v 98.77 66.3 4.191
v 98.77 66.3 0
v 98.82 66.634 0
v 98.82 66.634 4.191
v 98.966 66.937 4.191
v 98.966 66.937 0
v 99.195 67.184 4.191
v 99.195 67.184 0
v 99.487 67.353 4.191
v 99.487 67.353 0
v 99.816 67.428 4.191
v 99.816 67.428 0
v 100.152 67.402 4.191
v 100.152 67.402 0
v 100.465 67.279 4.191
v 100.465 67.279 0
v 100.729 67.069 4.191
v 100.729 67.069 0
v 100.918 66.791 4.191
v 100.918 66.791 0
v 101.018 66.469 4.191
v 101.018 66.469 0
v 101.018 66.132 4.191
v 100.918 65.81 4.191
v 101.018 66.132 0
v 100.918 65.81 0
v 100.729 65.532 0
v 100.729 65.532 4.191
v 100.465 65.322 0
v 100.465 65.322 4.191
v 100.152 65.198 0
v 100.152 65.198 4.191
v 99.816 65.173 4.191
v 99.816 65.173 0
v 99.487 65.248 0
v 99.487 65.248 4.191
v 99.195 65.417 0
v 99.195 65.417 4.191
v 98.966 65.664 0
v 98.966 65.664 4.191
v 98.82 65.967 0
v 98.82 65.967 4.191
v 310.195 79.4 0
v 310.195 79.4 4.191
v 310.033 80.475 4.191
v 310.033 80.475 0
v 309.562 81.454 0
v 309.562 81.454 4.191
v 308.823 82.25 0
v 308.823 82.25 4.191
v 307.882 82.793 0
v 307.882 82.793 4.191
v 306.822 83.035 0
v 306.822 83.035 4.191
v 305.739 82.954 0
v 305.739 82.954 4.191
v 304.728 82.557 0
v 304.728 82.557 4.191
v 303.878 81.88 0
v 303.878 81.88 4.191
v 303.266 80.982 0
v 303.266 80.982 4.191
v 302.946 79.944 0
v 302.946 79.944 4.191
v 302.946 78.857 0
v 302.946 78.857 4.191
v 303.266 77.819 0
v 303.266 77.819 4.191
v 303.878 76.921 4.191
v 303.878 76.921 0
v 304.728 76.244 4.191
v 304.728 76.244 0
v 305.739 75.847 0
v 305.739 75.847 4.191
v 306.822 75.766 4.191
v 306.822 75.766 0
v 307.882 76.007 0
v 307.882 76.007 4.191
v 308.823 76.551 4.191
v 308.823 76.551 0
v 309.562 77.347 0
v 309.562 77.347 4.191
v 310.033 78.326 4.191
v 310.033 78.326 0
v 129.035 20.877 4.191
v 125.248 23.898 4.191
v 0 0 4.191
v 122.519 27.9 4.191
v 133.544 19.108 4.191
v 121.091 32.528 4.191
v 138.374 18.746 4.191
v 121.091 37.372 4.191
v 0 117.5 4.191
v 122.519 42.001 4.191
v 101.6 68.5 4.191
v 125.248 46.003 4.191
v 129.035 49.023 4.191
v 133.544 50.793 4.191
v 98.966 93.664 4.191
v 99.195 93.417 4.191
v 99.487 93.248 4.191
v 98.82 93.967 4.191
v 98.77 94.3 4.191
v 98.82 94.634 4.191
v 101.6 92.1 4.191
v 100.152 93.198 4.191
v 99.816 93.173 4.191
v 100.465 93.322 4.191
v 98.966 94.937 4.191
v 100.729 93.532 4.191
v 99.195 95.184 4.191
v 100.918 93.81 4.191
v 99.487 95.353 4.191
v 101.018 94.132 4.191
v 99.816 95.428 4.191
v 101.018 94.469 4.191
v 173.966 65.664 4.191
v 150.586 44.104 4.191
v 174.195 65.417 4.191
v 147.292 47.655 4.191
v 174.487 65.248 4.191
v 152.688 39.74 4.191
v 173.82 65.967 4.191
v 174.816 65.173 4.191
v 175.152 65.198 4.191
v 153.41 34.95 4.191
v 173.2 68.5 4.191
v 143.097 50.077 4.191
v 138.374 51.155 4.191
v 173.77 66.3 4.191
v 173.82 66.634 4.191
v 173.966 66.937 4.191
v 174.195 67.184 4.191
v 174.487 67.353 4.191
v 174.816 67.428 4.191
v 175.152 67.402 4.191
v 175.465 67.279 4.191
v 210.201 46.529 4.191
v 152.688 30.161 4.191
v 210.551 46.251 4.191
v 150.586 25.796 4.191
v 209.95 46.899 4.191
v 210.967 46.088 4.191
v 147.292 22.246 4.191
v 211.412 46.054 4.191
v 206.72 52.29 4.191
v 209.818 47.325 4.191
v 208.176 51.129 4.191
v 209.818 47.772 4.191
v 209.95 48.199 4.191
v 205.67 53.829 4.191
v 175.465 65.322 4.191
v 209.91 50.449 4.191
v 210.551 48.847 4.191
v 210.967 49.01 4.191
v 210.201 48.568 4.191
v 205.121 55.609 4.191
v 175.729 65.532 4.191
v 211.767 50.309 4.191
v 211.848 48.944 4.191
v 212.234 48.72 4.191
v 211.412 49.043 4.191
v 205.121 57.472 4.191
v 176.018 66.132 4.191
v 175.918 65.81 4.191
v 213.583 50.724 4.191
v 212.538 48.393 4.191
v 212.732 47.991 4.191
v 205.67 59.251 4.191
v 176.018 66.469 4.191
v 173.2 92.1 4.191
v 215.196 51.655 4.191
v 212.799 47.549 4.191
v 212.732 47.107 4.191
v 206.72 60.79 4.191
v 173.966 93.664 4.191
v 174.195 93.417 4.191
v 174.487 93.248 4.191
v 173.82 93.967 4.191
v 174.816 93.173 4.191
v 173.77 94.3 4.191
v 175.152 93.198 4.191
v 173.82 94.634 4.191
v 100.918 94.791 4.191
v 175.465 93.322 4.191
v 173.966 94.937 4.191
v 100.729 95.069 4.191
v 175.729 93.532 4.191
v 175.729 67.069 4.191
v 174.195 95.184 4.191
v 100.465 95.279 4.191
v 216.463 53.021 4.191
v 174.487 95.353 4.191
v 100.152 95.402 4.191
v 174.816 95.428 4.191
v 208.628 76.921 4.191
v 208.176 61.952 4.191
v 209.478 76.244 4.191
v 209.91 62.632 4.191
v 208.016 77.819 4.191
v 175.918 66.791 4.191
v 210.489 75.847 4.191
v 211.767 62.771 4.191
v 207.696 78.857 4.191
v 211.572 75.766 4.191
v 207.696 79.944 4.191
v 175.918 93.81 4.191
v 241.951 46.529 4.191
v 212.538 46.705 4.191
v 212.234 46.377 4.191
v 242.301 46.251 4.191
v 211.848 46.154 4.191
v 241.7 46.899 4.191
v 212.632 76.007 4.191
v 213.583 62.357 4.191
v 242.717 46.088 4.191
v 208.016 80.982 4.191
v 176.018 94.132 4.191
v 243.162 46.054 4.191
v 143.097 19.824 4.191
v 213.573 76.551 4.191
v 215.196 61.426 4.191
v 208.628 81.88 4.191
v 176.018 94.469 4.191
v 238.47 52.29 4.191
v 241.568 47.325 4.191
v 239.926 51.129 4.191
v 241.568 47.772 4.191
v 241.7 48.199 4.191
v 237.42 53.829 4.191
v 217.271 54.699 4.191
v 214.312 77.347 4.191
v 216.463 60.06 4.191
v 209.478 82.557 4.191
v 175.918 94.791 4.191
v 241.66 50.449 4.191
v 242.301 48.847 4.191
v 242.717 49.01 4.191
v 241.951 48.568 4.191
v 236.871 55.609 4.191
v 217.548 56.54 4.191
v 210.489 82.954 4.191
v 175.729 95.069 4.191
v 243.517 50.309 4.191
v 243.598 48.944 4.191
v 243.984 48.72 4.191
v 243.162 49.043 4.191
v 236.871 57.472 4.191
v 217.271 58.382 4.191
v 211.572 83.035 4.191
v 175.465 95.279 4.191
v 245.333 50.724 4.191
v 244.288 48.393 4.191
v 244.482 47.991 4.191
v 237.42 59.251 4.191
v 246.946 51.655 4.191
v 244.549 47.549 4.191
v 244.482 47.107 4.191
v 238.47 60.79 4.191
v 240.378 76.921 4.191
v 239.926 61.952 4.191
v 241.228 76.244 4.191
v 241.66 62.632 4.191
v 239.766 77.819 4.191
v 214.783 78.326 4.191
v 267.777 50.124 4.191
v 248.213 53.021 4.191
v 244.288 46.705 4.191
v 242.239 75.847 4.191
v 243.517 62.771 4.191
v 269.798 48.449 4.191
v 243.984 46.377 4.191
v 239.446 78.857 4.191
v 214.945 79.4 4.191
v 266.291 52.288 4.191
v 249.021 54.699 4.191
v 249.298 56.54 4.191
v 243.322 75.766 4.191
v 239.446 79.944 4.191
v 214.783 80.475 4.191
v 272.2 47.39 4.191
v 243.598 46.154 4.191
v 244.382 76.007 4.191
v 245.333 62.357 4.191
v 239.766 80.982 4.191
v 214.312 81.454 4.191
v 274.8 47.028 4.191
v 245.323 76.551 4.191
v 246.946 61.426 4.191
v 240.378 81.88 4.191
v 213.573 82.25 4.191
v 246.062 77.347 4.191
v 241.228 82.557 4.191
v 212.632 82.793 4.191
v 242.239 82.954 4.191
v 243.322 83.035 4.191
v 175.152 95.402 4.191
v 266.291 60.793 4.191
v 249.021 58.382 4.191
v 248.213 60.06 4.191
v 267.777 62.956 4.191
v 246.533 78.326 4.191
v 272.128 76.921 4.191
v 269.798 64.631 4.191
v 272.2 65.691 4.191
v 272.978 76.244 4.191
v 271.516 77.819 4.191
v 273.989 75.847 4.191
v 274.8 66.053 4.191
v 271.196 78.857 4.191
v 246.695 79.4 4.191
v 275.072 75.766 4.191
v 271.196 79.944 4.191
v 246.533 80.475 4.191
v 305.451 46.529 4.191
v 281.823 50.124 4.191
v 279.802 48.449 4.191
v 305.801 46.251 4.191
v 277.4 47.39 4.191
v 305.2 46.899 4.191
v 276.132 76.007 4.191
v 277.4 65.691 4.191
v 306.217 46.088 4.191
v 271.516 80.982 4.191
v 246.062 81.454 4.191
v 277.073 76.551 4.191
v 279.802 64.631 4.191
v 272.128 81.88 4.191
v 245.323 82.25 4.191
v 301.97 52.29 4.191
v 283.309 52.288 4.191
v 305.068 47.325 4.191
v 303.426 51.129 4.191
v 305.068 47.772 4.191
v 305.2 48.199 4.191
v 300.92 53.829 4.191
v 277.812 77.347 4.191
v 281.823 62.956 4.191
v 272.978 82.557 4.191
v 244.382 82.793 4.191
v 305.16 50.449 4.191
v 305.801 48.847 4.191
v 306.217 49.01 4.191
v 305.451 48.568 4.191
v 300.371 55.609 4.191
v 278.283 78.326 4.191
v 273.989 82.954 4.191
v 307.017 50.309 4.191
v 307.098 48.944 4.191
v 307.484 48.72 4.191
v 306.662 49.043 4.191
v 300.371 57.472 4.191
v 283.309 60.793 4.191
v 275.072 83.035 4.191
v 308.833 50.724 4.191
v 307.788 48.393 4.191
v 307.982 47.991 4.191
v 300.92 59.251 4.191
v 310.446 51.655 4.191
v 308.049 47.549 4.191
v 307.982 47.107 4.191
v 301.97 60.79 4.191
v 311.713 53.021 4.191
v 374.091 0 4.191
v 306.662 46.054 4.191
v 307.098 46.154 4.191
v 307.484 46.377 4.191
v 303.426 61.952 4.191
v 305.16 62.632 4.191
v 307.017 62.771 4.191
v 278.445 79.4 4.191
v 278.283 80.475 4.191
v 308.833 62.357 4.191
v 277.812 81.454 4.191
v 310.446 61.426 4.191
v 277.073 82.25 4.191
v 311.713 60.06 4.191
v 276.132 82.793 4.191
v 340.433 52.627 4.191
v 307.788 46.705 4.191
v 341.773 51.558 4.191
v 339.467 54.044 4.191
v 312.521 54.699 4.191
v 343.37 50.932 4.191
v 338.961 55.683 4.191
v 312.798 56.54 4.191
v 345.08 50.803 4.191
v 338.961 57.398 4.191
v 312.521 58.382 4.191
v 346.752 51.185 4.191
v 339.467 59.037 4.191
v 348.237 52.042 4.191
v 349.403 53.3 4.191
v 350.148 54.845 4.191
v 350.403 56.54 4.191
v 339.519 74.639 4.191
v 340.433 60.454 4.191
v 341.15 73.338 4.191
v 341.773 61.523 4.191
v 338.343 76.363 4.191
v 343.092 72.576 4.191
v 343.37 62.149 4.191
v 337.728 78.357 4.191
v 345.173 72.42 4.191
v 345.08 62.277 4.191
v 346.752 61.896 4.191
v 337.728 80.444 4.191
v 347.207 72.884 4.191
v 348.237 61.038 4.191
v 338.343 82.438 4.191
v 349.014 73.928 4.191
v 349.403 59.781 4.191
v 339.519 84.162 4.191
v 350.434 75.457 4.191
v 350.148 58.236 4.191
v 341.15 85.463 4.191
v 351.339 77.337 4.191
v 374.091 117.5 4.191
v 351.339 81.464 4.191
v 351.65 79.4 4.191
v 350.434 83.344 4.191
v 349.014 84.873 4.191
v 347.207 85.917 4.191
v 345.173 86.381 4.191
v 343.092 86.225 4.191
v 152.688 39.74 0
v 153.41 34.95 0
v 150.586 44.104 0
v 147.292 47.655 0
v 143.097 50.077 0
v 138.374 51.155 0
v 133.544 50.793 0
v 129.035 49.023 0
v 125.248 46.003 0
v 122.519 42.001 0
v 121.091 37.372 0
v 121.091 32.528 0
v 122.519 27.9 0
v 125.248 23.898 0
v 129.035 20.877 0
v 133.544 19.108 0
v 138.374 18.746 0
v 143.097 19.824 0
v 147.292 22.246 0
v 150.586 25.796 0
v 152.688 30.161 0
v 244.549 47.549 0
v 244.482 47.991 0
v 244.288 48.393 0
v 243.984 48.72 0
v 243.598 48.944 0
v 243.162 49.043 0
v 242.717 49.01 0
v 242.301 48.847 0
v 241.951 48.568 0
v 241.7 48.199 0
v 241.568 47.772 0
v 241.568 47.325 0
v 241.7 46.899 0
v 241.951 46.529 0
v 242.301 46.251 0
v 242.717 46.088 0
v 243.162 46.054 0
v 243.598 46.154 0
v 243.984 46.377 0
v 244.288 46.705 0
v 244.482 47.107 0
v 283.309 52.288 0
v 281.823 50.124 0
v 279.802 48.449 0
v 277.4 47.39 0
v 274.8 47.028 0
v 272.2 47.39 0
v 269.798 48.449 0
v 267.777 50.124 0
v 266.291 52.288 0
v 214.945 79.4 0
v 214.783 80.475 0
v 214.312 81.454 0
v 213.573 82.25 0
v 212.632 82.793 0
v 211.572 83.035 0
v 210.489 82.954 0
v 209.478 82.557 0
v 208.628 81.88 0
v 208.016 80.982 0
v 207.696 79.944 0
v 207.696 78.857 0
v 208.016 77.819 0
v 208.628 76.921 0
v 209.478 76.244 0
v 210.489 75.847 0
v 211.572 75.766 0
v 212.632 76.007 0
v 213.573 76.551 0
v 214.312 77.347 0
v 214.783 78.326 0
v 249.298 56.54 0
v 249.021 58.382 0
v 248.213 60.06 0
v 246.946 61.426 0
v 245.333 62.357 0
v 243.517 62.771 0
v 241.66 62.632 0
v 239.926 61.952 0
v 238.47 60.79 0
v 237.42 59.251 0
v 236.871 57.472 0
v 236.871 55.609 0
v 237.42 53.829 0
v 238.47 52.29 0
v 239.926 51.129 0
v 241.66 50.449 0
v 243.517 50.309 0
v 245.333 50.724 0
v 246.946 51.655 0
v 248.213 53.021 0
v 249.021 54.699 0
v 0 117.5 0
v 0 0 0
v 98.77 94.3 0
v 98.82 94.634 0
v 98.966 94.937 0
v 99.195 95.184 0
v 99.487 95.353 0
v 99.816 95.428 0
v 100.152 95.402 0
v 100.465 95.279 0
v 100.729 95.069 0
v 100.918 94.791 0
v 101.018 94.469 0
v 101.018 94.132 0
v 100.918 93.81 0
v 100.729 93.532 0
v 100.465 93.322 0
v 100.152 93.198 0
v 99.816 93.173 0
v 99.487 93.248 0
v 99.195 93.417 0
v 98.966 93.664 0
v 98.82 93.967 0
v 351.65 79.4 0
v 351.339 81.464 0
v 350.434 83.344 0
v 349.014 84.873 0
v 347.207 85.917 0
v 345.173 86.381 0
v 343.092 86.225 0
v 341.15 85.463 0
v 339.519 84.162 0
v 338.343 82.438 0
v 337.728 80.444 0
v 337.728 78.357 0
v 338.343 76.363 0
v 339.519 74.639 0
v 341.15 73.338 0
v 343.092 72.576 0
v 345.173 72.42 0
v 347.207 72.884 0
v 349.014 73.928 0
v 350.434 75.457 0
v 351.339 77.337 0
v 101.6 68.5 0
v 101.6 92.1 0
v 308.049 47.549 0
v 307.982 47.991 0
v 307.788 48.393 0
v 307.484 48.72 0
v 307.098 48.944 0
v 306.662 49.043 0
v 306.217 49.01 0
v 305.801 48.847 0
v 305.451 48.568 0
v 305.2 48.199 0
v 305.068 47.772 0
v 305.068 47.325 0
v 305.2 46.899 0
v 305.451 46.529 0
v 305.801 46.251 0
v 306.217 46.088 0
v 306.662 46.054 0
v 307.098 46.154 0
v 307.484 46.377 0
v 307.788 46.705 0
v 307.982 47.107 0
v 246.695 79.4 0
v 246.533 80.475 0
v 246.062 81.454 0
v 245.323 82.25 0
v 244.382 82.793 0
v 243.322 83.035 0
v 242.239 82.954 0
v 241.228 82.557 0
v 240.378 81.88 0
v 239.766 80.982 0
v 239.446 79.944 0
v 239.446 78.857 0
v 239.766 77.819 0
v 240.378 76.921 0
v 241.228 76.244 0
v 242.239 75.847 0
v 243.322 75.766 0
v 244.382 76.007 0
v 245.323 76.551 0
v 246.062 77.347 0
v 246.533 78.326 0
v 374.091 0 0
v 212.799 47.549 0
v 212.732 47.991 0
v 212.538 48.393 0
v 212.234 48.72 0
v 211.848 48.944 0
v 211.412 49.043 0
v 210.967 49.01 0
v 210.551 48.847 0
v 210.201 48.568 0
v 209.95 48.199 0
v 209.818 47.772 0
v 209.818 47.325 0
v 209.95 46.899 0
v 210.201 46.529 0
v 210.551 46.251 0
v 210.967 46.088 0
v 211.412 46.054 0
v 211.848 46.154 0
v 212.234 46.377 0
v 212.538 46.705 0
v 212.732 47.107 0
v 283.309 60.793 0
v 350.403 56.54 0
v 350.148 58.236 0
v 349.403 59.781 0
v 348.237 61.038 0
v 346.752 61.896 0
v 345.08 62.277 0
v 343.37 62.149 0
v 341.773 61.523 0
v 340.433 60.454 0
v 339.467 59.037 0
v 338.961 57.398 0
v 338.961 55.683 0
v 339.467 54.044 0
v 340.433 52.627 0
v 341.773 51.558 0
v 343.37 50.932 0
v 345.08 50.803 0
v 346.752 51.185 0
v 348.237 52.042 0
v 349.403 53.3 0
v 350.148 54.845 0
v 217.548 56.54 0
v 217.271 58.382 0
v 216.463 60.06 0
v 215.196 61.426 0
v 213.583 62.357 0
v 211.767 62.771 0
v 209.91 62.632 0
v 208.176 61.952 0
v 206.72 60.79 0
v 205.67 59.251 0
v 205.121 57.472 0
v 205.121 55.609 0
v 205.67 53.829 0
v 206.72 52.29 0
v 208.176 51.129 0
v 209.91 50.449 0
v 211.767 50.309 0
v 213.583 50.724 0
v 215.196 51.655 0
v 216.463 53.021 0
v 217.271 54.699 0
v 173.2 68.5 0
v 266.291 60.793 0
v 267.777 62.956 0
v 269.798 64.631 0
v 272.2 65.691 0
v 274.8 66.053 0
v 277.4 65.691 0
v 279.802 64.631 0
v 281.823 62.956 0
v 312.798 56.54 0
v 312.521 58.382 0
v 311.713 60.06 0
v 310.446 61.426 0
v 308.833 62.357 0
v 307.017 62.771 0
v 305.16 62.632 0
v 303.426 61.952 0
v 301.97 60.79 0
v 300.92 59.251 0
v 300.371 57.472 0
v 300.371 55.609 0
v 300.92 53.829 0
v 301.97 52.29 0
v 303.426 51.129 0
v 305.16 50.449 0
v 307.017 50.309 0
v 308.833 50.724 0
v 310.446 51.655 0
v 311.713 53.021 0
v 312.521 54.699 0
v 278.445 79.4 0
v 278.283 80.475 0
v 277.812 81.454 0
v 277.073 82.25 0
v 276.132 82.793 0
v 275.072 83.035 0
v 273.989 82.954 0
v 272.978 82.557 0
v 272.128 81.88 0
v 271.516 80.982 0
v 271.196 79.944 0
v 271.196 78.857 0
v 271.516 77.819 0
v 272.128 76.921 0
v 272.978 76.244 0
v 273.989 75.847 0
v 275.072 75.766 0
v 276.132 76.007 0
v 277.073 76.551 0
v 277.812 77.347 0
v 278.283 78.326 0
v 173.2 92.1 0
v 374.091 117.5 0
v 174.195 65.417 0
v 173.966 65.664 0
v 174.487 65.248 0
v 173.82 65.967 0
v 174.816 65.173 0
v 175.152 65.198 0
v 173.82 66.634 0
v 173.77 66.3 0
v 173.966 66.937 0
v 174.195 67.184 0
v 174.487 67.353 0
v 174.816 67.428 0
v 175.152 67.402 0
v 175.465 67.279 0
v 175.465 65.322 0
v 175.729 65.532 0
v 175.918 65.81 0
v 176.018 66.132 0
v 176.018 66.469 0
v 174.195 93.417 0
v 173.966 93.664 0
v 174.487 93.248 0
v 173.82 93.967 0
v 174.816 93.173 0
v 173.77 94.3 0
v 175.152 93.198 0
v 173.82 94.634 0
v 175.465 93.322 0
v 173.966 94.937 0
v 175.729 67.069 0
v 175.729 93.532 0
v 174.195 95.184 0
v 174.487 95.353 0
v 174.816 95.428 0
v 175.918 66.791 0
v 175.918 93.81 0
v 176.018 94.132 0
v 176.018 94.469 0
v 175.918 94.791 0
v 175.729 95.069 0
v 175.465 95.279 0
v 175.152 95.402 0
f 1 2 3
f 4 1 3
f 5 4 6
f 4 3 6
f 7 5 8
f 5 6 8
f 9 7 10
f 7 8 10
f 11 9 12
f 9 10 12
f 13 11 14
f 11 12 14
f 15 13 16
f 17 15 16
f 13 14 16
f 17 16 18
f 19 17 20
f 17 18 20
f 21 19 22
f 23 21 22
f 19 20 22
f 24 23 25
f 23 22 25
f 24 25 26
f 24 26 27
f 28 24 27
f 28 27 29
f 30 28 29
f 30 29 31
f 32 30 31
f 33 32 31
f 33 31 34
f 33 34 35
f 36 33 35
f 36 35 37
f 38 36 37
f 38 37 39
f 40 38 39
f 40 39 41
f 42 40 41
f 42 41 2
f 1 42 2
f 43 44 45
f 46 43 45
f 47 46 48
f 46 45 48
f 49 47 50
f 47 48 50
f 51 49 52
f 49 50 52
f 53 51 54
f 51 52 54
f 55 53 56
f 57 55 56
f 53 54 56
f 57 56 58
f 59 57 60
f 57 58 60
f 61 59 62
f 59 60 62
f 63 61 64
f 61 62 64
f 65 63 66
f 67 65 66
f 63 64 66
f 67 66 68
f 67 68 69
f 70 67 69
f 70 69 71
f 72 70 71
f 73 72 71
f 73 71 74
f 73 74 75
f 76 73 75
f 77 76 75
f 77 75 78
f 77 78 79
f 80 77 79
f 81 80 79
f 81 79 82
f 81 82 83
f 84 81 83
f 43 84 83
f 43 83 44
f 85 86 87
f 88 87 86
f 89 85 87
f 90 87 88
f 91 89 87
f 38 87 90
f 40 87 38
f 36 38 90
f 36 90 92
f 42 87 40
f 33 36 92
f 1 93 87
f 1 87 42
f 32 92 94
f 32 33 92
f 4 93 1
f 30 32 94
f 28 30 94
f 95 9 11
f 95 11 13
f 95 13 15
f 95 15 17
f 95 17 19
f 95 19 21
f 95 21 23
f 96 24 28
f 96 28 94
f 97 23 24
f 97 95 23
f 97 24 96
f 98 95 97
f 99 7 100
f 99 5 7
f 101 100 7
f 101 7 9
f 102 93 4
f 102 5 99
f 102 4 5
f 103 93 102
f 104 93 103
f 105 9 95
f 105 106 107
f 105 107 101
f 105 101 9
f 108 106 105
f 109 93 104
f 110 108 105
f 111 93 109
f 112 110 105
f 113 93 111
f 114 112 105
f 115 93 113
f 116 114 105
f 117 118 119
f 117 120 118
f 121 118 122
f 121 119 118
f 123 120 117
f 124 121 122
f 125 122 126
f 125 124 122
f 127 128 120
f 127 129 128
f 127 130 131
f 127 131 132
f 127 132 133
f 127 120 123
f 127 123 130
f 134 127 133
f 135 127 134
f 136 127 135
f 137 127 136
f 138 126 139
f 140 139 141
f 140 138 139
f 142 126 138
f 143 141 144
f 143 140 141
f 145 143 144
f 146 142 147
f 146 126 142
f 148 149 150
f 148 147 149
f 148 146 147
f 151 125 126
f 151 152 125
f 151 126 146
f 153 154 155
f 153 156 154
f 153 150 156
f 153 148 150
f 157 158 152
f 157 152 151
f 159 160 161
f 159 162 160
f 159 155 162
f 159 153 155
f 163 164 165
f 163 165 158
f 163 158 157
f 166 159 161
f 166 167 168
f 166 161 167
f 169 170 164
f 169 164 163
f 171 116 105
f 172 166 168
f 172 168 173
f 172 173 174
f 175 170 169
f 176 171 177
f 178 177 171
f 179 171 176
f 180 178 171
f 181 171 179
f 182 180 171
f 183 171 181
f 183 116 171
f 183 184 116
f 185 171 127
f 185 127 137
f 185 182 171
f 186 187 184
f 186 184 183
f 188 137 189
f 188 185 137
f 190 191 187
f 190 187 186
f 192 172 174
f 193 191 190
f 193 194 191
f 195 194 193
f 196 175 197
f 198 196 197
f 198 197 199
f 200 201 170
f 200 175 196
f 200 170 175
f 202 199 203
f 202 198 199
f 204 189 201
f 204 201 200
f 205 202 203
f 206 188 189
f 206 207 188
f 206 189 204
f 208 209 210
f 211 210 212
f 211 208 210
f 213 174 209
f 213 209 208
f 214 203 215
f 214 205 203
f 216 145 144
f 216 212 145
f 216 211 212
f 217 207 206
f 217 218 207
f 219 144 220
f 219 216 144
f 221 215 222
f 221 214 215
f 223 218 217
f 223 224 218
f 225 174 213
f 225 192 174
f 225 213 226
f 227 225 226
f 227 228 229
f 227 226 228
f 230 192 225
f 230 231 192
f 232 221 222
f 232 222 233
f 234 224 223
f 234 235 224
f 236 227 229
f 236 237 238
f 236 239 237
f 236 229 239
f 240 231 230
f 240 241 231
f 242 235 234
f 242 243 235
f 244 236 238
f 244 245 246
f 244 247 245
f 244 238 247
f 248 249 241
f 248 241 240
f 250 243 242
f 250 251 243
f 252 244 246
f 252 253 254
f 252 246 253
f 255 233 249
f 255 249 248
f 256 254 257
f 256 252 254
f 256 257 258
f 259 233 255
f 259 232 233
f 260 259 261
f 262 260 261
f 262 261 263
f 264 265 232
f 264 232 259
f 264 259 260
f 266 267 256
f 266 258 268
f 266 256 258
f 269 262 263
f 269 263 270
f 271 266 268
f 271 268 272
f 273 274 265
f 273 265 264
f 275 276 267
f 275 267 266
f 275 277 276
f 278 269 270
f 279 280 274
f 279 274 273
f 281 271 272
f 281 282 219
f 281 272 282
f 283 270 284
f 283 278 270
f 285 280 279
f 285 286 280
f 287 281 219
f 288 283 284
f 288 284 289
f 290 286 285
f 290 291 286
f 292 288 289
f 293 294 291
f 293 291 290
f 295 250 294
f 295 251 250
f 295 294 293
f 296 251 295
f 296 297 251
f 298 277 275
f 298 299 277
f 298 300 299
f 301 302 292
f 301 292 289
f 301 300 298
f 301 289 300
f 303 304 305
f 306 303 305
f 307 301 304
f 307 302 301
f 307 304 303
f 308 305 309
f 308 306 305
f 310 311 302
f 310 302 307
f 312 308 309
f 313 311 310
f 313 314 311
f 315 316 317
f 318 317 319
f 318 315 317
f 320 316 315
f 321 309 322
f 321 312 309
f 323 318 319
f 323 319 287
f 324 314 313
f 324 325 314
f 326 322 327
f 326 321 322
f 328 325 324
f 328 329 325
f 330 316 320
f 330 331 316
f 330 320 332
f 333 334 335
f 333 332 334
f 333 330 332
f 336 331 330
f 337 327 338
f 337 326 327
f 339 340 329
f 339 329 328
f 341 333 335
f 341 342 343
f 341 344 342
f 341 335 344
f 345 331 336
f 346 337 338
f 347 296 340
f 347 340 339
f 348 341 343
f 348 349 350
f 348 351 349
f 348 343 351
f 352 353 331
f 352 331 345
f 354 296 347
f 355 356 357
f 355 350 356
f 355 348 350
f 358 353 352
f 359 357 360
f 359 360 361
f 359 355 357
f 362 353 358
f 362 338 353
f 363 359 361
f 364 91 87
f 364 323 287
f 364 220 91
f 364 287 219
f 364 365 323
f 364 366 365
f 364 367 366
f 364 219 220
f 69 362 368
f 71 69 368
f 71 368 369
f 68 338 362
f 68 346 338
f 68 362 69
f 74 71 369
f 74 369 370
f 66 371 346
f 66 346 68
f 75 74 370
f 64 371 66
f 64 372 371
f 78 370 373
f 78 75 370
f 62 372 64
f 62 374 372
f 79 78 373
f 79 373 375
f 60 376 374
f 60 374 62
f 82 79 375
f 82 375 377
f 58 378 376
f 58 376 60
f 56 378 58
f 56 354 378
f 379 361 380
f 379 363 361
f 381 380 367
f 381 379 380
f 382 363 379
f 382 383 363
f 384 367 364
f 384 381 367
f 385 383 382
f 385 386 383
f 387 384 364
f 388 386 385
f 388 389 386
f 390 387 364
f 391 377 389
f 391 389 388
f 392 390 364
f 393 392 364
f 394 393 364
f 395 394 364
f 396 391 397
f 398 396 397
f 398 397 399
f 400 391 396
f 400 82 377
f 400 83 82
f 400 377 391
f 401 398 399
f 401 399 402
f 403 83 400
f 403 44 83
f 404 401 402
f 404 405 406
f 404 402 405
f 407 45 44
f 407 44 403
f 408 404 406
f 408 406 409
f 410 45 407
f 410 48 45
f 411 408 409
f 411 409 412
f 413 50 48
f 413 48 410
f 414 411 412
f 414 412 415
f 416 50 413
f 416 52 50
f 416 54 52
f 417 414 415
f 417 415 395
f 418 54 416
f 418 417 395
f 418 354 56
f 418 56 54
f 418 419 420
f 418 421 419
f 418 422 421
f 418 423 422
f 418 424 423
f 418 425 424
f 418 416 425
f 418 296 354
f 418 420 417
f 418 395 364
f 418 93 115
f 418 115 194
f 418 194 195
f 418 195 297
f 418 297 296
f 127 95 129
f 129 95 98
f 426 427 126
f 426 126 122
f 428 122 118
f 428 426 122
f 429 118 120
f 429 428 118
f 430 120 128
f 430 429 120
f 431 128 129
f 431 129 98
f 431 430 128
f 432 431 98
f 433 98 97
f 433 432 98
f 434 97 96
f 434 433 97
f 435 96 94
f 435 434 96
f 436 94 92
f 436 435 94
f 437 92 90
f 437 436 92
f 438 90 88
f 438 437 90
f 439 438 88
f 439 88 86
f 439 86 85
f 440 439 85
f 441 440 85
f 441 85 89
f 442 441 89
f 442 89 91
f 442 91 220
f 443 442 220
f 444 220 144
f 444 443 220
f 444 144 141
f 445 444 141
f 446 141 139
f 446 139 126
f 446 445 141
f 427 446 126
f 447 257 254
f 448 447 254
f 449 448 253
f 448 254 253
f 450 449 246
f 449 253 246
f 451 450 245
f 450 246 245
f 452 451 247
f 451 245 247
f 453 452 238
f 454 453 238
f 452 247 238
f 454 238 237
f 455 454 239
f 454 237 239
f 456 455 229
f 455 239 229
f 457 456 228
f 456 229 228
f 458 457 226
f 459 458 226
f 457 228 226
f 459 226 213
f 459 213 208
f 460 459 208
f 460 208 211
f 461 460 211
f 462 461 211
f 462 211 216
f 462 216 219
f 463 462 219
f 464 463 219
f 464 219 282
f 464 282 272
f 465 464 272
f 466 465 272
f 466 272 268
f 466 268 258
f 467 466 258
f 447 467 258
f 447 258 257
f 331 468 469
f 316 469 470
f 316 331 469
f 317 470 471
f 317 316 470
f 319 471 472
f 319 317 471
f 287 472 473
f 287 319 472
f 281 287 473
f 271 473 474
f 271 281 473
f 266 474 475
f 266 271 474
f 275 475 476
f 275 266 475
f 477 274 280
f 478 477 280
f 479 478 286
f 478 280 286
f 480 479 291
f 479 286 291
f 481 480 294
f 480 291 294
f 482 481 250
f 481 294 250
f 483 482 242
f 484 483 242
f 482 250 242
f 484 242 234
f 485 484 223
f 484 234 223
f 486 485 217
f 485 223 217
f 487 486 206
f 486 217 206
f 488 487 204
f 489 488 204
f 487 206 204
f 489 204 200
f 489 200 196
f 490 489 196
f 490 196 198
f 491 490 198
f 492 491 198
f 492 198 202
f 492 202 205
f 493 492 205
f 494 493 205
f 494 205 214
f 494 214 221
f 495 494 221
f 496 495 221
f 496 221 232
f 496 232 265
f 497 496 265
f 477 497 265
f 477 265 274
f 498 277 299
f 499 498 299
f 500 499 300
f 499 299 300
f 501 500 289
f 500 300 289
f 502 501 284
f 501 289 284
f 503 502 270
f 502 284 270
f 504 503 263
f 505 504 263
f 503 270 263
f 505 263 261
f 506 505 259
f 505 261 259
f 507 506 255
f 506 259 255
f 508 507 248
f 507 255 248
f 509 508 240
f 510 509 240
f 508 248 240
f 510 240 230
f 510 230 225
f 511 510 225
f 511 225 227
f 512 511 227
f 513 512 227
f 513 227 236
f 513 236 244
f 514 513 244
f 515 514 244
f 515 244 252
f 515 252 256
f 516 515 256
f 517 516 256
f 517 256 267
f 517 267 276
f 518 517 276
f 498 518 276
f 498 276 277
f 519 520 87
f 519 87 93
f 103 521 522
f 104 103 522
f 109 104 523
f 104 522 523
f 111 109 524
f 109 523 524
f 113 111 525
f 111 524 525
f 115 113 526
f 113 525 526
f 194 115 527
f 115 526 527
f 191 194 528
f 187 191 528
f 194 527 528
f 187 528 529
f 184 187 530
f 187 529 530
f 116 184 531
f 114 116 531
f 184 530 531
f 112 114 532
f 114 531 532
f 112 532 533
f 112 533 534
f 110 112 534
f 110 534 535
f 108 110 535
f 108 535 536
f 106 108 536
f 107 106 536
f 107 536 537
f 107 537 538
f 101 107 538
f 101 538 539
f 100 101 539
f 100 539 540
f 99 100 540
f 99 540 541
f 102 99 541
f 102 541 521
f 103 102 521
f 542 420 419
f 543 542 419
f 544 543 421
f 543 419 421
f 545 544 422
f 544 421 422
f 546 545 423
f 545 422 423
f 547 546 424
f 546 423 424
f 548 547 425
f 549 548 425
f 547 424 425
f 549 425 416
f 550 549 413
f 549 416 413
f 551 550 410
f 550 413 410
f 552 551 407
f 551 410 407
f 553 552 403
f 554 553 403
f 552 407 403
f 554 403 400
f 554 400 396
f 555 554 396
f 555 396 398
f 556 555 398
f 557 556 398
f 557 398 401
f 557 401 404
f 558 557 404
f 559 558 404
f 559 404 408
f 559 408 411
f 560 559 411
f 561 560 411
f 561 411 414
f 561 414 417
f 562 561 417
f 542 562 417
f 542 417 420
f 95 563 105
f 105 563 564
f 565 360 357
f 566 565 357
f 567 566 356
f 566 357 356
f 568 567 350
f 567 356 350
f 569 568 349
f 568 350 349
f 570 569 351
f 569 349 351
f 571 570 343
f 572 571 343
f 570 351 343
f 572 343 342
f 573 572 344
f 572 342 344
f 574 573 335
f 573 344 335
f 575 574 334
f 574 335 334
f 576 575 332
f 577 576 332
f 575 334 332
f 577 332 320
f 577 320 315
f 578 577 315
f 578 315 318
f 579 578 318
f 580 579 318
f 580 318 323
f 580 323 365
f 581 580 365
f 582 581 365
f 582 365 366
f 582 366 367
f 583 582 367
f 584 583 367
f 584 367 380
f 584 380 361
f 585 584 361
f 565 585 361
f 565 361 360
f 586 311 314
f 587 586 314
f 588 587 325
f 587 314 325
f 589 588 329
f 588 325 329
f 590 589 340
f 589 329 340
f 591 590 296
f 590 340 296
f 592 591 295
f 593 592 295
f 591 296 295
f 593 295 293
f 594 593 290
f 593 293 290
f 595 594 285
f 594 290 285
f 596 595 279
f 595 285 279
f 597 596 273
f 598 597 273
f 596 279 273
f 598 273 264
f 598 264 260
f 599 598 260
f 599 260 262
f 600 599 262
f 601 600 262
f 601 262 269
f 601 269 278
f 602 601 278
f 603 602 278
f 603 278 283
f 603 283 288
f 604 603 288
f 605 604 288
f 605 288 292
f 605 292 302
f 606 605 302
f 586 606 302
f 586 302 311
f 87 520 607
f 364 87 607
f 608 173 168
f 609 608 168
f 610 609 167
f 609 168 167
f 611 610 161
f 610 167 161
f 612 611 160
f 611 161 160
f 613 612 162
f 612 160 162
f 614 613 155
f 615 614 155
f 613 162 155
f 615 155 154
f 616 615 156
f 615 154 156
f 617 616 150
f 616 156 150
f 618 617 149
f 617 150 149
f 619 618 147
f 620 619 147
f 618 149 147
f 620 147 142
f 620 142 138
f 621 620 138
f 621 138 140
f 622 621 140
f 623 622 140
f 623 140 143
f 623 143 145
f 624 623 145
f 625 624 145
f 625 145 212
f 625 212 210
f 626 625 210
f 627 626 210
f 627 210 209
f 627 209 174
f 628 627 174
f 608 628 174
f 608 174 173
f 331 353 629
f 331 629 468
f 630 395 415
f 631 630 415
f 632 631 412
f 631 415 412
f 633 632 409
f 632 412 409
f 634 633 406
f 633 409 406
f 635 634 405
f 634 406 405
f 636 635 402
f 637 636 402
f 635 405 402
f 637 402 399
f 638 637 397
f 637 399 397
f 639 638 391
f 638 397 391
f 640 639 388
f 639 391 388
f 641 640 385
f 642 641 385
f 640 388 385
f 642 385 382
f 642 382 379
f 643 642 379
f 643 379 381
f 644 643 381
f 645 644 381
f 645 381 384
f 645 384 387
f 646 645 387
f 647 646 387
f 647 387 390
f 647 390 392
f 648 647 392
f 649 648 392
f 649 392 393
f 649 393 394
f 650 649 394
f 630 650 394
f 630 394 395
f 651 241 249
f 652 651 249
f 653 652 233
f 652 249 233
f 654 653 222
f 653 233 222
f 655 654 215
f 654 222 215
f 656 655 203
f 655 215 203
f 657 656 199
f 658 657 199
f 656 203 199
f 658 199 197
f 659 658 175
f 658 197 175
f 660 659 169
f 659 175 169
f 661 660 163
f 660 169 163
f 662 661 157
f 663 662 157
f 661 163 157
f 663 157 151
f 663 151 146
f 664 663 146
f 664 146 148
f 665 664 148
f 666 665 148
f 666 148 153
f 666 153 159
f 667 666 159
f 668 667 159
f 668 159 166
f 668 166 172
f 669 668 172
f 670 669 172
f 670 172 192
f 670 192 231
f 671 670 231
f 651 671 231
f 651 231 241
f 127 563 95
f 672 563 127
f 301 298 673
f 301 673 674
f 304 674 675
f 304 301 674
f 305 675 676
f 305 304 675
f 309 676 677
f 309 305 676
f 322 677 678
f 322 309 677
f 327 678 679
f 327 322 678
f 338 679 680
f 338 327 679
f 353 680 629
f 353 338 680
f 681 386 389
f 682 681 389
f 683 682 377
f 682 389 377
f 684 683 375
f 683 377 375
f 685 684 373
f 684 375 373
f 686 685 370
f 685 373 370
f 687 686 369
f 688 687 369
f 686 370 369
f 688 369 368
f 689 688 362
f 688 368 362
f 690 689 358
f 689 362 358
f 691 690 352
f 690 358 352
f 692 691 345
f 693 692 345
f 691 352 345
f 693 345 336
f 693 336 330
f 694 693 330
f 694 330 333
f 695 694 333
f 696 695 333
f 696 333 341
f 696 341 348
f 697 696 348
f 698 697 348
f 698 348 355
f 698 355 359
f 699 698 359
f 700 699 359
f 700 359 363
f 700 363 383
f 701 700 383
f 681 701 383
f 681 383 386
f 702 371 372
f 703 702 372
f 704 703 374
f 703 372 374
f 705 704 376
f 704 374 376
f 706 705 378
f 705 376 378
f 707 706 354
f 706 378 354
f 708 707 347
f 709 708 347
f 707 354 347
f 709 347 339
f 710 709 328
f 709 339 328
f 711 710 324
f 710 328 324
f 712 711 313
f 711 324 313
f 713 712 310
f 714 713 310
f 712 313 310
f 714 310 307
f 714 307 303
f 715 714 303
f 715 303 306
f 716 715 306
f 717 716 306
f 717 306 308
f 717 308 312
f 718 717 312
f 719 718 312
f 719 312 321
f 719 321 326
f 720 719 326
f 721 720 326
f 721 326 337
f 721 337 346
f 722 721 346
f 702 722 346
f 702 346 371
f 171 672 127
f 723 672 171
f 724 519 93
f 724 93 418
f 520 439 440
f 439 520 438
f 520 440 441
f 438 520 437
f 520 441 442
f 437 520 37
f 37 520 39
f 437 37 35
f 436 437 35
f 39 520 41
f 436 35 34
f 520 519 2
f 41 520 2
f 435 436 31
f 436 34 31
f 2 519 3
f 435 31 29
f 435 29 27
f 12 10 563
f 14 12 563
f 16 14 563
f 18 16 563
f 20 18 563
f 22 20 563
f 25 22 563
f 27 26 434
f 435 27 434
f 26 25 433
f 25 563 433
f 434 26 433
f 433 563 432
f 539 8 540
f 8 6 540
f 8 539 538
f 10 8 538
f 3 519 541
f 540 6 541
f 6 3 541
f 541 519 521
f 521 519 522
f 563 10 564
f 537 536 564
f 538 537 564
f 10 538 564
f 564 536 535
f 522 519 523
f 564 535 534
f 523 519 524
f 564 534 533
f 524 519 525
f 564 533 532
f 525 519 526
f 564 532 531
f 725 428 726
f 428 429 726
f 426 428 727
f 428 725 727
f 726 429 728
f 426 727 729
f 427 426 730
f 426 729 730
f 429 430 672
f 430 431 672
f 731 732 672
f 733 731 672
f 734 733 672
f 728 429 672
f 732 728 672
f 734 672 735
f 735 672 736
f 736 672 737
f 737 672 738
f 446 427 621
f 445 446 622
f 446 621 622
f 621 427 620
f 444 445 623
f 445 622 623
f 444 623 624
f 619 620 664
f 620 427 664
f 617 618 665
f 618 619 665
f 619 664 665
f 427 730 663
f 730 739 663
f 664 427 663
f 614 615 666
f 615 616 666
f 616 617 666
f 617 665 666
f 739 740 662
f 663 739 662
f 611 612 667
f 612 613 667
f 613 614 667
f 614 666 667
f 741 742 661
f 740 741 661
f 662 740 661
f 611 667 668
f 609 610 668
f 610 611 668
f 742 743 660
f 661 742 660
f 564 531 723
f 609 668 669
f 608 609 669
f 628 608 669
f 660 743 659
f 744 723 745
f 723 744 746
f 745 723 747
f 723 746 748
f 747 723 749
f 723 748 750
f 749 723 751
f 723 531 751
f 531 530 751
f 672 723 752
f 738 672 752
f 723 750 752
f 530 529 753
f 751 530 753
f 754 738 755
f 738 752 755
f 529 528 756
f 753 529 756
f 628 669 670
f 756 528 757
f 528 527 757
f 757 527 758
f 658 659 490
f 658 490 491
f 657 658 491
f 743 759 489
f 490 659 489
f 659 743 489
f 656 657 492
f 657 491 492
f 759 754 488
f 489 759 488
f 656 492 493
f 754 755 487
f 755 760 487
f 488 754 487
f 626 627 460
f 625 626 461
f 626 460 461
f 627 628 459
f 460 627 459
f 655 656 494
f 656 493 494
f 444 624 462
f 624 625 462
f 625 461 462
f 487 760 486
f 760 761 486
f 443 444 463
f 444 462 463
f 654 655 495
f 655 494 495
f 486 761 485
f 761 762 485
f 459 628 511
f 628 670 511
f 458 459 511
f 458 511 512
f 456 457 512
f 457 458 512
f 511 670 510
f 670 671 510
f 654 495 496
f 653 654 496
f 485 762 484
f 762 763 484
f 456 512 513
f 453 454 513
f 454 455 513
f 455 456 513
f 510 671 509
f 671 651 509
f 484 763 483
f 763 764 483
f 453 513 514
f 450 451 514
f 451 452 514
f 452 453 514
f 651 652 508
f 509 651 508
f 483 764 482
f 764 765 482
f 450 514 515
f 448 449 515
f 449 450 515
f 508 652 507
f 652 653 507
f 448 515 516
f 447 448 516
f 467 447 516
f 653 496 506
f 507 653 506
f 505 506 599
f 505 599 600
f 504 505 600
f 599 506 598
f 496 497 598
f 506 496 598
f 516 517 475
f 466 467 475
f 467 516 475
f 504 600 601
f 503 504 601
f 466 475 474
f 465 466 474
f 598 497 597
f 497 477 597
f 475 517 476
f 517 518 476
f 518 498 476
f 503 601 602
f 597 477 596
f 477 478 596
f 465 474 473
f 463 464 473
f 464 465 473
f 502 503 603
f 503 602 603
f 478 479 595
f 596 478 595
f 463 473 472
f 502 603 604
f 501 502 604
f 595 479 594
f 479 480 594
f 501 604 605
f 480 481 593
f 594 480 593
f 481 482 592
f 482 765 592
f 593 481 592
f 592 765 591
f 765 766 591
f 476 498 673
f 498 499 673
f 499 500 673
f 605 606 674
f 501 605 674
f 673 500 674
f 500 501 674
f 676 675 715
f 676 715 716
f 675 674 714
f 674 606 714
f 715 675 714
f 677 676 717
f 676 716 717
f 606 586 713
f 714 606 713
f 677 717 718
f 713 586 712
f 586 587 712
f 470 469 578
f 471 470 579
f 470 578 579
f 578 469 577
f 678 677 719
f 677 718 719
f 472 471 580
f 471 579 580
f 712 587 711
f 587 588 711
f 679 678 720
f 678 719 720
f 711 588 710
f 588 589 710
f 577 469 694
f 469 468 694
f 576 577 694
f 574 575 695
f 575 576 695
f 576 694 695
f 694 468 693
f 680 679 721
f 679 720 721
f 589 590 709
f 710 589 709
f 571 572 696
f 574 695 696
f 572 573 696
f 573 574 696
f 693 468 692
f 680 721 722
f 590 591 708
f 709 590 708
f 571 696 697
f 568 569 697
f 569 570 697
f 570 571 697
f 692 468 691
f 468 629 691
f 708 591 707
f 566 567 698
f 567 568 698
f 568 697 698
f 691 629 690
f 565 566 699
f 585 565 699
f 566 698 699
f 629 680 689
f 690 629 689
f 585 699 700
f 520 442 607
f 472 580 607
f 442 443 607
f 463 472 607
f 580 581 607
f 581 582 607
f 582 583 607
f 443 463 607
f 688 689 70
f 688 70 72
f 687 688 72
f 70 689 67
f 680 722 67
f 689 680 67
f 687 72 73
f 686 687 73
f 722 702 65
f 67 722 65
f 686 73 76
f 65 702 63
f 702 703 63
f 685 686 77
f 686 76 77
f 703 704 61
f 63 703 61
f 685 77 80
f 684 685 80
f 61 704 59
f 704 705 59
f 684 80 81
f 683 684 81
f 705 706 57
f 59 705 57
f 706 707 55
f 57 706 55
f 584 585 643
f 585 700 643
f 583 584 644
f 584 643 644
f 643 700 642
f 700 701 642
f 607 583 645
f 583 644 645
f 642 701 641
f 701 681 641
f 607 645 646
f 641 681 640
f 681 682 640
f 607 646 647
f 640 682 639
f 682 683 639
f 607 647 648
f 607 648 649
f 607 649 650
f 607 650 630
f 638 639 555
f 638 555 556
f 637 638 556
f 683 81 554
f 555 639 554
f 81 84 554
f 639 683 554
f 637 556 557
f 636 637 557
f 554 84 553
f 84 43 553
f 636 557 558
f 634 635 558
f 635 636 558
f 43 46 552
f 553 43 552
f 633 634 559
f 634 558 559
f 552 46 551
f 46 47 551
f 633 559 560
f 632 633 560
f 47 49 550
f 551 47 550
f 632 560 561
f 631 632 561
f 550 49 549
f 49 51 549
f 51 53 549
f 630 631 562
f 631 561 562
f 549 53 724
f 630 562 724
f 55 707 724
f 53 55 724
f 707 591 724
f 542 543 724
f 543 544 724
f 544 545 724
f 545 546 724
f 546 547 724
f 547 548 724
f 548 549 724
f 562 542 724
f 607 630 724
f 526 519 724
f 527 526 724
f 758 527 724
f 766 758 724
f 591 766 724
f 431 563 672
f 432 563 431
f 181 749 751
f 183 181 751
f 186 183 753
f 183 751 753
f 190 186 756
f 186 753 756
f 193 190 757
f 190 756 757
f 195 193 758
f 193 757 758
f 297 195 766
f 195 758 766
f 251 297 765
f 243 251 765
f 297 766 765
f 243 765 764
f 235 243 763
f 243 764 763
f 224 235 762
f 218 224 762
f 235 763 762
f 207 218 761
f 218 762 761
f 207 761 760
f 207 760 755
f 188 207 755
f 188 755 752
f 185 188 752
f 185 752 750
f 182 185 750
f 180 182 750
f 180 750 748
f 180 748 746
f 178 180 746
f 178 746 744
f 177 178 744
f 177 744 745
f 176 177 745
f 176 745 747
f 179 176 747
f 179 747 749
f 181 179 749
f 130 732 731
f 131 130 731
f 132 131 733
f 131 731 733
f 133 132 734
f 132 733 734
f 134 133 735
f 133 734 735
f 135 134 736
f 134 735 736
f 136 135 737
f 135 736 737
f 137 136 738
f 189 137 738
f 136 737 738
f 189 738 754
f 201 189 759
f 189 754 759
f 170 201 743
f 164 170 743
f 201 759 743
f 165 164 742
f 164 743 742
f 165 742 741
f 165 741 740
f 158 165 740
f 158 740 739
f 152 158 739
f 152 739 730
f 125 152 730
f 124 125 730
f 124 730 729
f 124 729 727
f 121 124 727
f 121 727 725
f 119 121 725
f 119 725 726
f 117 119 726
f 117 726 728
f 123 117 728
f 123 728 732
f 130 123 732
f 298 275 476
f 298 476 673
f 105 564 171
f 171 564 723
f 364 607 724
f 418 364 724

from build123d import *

# Parameters (mm, degrees)
SKETCH2_W             = 374.0912
SKETCH2_H             = 117.5004
SKETCH2_R             = 16.25
SKETCH2_W_2           = 71.6
SKETCH2_H_2           = 23.6
BOSS_EXTRUDE1_DEPTH   = 4.191
F_4_40_TAPPED_HOLE1_D = 2.2606
SKETCH7_R             = 3.6449
SKETCH7_R_2           = 6.2484
SKETCH7_R_3           = 1.4986
SKETCH7_R_4           = 7
SKETCH7_R_5           = 5.7531
CUT_EXTRUDE1_DEPTH    = 393.132801993


with BuildPart() as part:
    # Sketch2 → Boss-Extrude1 (new body)
    with BuildSketch(Plane.XY):
        with Locations((187.0456, 58.7502)):
            Rectangle(SKETCH2_W, SKETCH2_H)
        with Locations((137.16, 34.9504)):
            Circle(SKETCH2_R, mode=Mode.SUBTRACT)
        with Locations((137.4, 80.3004)):
            Rectangle(SKETCH2_W_2, SKETCH2_H_2, mode=Mode.SUBTRACT)
    extrude(amount=BOSS_EXTRUDE1_DEPTH)

    # #4-40 Tapped Hole1 (through all)
    with Locations(Plane.XY.offset(4.191)):
        with Locations((99.9, 94.3004), (174.9, 94.3004), (174.9, 66.3004), (99.9, 66.3004)):
            Hole(F_4_40_TAPPED_HOLE1_D / 2)

    # Sketch7 → Cut-Extrude1 (cut, through all)
    with BuildSketch(Plane.XY.offset(4.191)):
        with Locations((211.3, 79.4004)):
            Circle(SKETCH7_R)
        with Locations((211.3, 56.5404)):
            Circle(SKETCH7_R_2)
        with Locations((211.3, 47.5488)):
            Circle(SKETCH7_R_3)
        with Locations((243.05, 79.4004)):
            Circle(SKETCH7_R)
        with Locations((243.05, 56.5404)):
            Circle(SKETCH7_R_2)
        with Locations((243.05, 47.5488)):
            Circle(SKETCH7_R_3)
        with Locations((274.8, 79.4004)):
            Circle(SKETCH7_R)
        with Locations((306.55, 79.4004)):
            Circle(SKETCH7_R)
        with Locations((306.55, 56.5404)):
            Circle(SKETCH7_R_2)
        with Locations((306.55, 47.5488)):
            Circle(SKETCH7_R_3)
        with Locations((344.65, 79.4004)):
            Circle(SKETCH7_R_4)
        with Locations((344.65, 56.5404)):
            Circle(SKETCH7_R_5)
        with BuildLine():
            Line((266.291, 52.288251097), (266.291, 60.792548903))
            ThreePointArc((266.291, 60.792548903), (274.8, 66.0527), (283.309, 60.792548903))
            Line((283.309, 60.792548903), (283.309, 52.288251097))
            ThreePointArc((283.309, 52.288251097), (274.8, 47.0281), (266.291, 52.288251097))
        make_face()
    extrude(amount=-CUT_EXTRUDE1_DEPTH, mode=Mode.SUBTRACT)


solid = part.part
